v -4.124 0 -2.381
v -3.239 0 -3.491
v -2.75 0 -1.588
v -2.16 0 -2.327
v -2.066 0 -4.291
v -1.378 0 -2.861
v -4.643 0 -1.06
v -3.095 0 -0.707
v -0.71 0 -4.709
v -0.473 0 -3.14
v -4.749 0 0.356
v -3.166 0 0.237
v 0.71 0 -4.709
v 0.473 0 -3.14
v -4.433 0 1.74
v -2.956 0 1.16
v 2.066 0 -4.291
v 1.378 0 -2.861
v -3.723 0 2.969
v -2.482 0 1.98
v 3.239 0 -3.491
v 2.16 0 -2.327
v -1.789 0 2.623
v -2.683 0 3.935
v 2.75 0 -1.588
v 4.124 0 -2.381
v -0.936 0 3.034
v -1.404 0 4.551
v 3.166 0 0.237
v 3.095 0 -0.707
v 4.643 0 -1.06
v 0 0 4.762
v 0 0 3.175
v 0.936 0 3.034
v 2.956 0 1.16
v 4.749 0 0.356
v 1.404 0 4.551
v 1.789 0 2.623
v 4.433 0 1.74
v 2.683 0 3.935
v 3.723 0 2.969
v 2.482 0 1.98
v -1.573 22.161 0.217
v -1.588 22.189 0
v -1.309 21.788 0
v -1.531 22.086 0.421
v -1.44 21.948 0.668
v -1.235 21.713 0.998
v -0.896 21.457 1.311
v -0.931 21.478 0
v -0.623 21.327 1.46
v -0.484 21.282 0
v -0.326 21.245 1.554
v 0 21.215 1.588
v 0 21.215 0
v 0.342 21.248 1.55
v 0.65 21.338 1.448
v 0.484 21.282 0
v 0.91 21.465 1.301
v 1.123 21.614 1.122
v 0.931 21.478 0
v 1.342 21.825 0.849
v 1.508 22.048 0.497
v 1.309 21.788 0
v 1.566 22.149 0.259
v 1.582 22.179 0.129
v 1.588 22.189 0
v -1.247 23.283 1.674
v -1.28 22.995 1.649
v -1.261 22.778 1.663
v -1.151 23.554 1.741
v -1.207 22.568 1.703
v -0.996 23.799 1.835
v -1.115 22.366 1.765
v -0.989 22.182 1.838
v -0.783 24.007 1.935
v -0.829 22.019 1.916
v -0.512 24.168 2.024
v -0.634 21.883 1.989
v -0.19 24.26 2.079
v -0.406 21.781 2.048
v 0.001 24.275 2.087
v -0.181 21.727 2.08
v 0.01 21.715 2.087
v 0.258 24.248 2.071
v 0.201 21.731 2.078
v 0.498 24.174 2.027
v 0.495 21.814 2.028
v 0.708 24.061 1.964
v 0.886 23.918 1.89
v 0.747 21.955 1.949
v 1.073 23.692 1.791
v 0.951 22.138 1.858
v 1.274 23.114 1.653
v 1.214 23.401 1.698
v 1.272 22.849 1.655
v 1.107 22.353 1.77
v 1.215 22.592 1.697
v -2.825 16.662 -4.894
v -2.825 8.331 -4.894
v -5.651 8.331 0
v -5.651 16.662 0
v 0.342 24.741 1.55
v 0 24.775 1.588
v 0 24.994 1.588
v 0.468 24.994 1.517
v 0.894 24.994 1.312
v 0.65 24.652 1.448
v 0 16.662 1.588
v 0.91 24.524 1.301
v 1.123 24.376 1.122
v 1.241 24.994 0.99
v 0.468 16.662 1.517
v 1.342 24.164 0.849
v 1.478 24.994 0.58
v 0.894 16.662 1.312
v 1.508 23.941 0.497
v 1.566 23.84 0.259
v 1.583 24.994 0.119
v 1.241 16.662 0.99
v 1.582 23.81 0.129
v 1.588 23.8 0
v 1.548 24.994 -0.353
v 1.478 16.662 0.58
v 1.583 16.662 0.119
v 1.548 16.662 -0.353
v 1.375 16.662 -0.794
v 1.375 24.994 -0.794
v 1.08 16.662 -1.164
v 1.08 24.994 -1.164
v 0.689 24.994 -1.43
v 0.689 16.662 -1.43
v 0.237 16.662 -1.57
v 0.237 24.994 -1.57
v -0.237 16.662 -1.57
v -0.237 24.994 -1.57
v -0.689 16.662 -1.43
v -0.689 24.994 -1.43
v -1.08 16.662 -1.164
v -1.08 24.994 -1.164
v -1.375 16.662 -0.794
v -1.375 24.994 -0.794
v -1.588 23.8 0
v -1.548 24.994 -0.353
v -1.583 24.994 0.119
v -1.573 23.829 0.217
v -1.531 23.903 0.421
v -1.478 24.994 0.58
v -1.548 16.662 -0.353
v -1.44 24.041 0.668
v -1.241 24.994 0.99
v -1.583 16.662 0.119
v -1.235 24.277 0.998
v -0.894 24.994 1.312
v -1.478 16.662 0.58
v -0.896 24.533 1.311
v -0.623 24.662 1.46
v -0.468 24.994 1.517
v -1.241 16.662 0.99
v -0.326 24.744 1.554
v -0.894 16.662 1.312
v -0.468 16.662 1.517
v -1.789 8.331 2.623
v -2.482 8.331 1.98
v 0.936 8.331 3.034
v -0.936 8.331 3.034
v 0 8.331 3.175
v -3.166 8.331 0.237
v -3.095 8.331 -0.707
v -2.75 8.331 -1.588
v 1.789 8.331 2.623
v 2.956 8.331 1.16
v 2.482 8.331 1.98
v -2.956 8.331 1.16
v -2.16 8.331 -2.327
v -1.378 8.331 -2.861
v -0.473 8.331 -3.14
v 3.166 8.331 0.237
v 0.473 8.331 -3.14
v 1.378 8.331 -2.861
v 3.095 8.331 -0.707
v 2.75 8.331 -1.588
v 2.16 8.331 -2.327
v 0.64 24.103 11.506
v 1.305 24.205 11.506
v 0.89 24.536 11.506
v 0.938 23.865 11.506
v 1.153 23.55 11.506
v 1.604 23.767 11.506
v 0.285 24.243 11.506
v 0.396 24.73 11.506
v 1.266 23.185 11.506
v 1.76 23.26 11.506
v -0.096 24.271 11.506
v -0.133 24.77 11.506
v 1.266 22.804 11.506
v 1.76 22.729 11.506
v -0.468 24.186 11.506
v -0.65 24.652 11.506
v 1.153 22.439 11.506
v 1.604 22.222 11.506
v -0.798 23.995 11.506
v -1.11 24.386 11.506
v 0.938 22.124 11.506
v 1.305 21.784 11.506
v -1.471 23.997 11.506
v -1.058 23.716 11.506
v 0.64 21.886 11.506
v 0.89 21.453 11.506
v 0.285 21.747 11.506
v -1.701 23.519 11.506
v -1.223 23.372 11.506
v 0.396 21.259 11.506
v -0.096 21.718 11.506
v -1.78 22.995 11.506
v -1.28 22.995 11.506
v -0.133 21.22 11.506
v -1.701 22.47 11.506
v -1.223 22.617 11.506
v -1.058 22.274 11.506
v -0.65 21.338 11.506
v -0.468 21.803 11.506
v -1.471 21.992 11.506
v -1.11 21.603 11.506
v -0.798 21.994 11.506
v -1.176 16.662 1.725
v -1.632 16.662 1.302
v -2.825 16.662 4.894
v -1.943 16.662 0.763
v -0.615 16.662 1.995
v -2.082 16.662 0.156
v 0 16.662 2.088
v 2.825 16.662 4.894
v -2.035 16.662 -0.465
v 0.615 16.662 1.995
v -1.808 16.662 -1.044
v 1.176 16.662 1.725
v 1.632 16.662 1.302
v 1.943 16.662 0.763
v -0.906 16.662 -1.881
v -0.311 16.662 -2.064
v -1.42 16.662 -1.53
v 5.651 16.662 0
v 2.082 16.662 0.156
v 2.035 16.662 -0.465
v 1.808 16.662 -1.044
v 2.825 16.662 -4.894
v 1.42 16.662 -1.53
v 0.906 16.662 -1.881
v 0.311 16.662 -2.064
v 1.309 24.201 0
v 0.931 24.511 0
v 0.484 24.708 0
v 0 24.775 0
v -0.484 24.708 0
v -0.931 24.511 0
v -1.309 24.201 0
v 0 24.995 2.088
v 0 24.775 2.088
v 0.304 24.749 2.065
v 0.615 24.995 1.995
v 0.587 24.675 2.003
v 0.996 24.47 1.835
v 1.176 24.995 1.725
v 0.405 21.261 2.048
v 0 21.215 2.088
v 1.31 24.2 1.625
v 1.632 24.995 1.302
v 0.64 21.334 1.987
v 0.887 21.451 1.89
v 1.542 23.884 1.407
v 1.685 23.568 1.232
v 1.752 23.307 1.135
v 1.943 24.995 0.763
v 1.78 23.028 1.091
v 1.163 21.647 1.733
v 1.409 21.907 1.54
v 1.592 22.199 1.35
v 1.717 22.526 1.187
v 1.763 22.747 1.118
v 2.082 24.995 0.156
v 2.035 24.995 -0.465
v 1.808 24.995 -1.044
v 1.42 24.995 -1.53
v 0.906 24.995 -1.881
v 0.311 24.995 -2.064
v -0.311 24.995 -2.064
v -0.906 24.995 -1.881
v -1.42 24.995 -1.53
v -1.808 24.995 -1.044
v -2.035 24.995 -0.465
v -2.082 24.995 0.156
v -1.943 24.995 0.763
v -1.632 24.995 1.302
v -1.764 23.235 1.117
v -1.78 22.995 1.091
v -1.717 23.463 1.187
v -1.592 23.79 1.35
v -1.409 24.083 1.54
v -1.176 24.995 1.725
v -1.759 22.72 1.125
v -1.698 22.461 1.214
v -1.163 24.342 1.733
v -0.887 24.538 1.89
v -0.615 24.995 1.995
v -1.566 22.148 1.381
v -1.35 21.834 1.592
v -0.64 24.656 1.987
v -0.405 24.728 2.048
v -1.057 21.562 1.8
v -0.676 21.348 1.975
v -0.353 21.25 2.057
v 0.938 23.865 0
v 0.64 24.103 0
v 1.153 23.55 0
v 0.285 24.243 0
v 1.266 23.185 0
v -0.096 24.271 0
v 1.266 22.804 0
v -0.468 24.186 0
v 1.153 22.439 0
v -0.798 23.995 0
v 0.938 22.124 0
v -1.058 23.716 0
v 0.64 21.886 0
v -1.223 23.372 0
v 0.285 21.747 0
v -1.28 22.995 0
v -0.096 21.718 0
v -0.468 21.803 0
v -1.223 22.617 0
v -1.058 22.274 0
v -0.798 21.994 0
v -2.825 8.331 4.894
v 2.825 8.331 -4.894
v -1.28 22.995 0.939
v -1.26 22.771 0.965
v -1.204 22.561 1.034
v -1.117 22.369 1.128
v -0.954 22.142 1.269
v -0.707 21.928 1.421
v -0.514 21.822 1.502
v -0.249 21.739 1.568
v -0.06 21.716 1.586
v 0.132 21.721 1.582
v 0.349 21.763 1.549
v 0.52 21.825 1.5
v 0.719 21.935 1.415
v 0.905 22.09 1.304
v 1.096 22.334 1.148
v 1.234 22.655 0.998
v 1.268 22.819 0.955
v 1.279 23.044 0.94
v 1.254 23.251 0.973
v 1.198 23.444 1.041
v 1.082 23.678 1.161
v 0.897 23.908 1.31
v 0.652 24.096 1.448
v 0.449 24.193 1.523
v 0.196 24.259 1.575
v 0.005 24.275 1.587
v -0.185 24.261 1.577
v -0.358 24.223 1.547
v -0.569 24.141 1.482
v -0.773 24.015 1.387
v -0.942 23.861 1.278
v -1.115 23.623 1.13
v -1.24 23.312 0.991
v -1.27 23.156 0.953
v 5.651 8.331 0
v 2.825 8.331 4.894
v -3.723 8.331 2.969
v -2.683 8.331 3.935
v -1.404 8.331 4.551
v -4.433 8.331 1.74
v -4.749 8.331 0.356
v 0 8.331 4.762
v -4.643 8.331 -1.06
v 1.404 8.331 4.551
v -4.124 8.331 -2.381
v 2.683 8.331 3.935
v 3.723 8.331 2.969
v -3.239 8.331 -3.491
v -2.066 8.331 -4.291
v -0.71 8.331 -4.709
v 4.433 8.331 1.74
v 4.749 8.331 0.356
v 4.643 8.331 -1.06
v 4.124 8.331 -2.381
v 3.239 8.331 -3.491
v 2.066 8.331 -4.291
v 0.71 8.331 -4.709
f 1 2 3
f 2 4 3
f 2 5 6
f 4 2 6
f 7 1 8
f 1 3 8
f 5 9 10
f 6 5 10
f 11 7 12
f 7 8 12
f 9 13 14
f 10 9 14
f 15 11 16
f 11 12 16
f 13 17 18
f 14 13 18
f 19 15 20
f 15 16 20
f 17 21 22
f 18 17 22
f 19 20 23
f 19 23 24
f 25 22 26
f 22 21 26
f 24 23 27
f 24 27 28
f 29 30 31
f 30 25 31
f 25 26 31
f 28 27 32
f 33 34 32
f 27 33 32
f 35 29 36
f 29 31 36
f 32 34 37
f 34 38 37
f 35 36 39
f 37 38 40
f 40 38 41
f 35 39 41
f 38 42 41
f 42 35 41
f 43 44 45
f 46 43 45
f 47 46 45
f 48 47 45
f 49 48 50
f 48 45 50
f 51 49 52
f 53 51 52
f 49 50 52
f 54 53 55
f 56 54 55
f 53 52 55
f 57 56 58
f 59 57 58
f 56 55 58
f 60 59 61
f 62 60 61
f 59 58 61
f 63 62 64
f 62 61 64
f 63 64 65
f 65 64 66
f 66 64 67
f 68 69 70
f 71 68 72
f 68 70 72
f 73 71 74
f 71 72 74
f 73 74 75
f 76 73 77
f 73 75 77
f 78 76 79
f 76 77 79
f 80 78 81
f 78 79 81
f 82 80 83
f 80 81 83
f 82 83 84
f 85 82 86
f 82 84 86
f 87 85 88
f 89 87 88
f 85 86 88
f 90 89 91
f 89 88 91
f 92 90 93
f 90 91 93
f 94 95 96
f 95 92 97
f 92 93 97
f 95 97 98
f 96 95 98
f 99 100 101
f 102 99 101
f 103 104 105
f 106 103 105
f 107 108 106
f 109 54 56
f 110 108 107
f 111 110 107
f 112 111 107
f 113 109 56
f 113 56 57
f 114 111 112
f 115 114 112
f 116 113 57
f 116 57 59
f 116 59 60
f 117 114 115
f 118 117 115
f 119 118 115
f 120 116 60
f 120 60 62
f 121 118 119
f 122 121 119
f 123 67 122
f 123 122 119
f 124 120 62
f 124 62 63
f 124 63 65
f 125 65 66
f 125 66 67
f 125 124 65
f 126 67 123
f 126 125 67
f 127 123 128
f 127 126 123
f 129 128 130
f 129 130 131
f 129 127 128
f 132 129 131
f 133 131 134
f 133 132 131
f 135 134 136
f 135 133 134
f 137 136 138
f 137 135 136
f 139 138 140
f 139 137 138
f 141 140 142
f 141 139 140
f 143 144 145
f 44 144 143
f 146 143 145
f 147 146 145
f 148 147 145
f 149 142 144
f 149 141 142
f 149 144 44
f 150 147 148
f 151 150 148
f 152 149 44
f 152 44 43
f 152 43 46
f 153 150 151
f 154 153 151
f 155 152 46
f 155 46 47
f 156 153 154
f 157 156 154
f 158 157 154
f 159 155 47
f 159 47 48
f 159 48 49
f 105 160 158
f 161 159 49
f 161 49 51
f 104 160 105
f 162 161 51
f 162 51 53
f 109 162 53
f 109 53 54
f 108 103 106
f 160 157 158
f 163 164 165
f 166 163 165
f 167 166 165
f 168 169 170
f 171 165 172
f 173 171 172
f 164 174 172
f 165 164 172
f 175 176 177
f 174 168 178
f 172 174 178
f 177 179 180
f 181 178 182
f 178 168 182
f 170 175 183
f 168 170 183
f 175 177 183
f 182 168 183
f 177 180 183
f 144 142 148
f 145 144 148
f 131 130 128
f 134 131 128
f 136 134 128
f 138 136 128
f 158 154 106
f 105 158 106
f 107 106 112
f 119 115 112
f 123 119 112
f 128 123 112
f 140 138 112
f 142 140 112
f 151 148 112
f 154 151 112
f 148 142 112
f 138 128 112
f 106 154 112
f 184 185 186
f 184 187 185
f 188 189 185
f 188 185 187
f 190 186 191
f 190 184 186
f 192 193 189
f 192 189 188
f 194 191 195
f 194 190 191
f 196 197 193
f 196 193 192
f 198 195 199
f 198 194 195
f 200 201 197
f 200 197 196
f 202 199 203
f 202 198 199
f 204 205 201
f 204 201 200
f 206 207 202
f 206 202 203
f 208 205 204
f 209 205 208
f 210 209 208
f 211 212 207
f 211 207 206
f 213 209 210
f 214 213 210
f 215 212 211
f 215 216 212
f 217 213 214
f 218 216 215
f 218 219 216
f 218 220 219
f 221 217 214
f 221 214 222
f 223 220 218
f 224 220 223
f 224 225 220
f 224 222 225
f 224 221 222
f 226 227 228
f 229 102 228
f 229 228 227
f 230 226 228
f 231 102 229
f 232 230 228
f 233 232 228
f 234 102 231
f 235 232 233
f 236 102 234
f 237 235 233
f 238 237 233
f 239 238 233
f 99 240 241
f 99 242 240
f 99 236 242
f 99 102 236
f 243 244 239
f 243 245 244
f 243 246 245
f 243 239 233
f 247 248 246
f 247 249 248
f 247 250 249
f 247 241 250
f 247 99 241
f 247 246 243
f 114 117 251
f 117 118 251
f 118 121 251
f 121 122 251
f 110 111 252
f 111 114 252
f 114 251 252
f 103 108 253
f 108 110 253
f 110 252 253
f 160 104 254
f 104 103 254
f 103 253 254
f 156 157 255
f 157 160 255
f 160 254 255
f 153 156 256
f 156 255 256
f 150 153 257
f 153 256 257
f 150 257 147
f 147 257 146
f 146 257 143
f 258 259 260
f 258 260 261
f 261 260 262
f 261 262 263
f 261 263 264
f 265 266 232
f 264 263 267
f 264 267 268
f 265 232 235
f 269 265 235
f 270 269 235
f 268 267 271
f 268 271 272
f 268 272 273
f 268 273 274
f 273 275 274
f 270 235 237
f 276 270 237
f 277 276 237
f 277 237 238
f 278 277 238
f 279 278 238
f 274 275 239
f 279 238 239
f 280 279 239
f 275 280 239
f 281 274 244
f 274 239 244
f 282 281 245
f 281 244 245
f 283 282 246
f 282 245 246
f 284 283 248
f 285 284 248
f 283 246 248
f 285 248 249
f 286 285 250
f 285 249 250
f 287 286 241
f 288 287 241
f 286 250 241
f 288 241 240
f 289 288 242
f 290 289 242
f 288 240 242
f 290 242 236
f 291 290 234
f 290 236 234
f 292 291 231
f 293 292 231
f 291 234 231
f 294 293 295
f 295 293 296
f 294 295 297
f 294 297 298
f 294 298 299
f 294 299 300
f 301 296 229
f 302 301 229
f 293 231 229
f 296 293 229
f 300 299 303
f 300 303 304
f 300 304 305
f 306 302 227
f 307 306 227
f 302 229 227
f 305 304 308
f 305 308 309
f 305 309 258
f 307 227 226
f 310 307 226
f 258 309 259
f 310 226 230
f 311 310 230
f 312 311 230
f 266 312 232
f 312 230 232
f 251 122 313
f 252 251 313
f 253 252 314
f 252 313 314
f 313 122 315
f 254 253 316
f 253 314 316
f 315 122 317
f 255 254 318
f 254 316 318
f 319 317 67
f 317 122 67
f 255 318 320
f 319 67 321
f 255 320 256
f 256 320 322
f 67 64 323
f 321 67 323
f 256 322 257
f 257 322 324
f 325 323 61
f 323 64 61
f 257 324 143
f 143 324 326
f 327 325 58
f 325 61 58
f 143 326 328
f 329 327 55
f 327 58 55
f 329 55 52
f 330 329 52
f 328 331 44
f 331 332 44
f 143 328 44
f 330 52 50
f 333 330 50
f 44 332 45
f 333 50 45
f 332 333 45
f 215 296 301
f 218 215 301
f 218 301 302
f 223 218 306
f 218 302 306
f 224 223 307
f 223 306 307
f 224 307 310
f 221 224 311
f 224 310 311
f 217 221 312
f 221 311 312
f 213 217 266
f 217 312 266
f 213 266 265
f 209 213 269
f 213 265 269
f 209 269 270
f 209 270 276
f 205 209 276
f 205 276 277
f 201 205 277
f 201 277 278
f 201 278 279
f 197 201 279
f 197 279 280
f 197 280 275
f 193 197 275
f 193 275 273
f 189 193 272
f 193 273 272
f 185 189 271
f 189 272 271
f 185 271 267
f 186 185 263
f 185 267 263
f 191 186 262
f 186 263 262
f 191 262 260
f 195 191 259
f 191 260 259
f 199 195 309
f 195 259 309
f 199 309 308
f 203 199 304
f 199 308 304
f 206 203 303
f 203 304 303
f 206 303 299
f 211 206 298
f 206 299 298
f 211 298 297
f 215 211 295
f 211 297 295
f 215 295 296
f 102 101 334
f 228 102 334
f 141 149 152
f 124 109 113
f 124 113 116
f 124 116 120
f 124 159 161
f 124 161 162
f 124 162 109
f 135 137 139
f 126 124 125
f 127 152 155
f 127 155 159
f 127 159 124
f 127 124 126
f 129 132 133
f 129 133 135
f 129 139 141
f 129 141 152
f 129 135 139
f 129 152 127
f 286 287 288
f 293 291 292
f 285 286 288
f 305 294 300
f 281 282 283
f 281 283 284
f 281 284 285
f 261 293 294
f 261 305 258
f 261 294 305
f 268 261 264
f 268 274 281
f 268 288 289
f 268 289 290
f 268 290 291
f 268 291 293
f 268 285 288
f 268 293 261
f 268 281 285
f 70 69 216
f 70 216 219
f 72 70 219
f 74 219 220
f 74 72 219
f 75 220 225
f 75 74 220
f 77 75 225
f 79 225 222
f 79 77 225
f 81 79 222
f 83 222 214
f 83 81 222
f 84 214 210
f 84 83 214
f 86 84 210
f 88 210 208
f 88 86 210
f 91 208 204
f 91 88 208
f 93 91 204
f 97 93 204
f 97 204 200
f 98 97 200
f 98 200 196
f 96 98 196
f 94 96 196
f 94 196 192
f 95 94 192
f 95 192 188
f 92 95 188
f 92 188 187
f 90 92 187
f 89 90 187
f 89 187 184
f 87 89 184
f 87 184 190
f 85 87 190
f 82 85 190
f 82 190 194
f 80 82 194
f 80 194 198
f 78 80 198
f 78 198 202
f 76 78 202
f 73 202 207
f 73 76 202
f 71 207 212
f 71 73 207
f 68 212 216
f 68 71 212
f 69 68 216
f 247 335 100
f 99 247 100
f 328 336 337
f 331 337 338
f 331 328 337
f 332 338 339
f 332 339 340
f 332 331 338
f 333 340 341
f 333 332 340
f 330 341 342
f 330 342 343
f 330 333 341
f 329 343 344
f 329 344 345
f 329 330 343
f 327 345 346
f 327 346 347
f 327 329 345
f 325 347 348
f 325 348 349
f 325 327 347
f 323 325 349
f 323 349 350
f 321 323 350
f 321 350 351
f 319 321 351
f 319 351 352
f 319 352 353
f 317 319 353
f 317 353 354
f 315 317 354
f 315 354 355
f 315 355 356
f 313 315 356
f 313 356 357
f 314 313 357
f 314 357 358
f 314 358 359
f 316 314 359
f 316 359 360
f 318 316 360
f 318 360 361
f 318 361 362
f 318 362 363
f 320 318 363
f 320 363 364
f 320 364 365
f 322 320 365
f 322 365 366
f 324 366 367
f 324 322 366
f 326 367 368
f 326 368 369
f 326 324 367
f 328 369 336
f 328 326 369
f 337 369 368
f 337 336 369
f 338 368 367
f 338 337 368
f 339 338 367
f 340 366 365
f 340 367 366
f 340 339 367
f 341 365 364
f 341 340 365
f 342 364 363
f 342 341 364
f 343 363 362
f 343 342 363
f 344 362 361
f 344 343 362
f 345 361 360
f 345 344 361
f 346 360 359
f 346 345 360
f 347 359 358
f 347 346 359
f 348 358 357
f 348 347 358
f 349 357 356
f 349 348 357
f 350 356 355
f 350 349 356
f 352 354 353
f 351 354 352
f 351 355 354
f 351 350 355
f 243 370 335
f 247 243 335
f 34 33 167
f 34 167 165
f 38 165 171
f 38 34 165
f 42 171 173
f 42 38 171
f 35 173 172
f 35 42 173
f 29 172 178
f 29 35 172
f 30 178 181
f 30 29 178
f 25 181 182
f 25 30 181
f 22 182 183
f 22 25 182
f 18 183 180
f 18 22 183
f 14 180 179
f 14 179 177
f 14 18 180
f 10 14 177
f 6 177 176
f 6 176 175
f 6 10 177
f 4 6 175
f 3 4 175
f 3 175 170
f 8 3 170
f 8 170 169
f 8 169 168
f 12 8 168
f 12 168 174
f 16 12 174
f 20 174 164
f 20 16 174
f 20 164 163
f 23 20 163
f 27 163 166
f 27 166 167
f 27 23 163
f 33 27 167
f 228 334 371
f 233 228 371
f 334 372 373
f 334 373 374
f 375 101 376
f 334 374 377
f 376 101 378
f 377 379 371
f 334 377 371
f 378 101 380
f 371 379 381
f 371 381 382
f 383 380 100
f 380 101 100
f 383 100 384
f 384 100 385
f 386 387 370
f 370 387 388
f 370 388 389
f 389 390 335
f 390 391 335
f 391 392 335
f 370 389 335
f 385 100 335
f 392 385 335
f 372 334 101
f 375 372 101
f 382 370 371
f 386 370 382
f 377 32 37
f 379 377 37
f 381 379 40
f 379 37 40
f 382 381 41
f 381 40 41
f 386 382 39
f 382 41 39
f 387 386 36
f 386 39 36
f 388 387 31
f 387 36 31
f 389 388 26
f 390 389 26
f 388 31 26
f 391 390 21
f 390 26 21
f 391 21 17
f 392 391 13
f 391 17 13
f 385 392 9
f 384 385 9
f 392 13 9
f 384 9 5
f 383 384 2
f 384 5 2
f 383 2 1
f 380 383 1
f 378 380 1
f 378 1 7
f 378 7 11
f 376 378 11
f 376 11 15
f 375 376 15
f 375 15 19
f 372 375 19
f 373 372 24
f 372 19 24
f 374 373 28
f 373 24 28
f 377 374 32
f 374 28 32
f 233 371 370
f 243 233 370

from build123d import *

# Parameters (mm, degrees)
SKETCH1_R           = 4.7625
SKETCH1_R_2         = 3.175
BOSS_EXTRUDE1_DEPTH = 8.3312
BOSS_EXTRUDE2_DEPTH = 8.3312
SKETCH3_R           = 2.0875
SKETCH3_R_2         = 1.5875
BOSS_EXTRUDE3_DEPTH = 8.3312
SKETCH4_R           = 2.0875
BOSS_EXTRUDE4_DEPTH = 0.001
SKETCH5_R           = 1.78
SKETCH5_R_2         = 1.28
BOSS_EXTRUDE5_DEPTH = 11.5062


with BuildPart() as part:
    # Sketch1 → Boss-Extrude1 (new body)
    with BuildSketch(Plane(origin=(0, 0, 0), x_dir=(1, 0, 0), z_dir=(0, 1, 0))):
        with Locations(Location((0, 0, 0), (0, 0, 270))):
            Circle(SKETCH1_R)
        with Locations(Location((0, 0, 0), (0, 0, 270))):
            Circle(SKETCH1_R_2, mode=Mode.SUBTRACT)
    extrude(amount=BOSS_EXTRUDE1_DEPTH)

    # Sketch2 → Boss-Extrude2 (add)
    with BuildSketch(Plane(origin=(0, 8.3312, 0), x_dir=(1, 0, 0), z_dir=(0, 1, 0))):
        Polygon((5.65061043, 0), (2.825305215, 4.893572179), (-2.825305215, 4.893572179), (-5.65061043, 0), (-2.825305215, -4.893572179), (2.825305215, -4.893572179), align=None)
    extrude(amount=BOSS_EXTRUDE2_DEPTH)

    # Sketch3 → Boss-Extrude3 (add)
    with BuildSketch(Plane(origin=(0, 16.6624, 0), x_dir=(1, 0, 0), z_dir=(0, 1, 0))):
        with Locations(Location((0, 0, 0), (0, 0, 270))):
            Circle(SKETCH3_R)
        with Locations(Location((0, 0, 0), (0, 0, 270))):
            Circle(SKETCH3_R_2, mode=Mode.SUBTRACT)
    extrude(amount=BOSS_EXTRUDE3_DEPTH)

    # Sketch4 → Boss-Extrude4 (add)
    with BuildSketch(Plane(origin=(0, 24.9936, 0), x_dir=(1, 0, 0), z_dir=(0, 1, 0))):
        with Locations(Location((0, 0, 0), (0, 0, 270))):
            Circle(SKETCH4_R)
    extrude(amount=BOSS_EXTRUDE4_DEPTH)

    # Sketch5 → Boss-Extrude5 (add)
    with BuildSketch(Plane.XY):
        with Locations(Location((0, 22.9946, 0), (0, 0, 180))):
            Circle(SKETCH5_R)
        with Locations(Location((0, 22.9946, 0), (0, 0, 180))):
            Circle(SKETCH5_R_2, mode=Mode.SUBTRACT)
    extrude(amount=BOSS_EXTRUDE5_DEPTH)


solid = part.part
